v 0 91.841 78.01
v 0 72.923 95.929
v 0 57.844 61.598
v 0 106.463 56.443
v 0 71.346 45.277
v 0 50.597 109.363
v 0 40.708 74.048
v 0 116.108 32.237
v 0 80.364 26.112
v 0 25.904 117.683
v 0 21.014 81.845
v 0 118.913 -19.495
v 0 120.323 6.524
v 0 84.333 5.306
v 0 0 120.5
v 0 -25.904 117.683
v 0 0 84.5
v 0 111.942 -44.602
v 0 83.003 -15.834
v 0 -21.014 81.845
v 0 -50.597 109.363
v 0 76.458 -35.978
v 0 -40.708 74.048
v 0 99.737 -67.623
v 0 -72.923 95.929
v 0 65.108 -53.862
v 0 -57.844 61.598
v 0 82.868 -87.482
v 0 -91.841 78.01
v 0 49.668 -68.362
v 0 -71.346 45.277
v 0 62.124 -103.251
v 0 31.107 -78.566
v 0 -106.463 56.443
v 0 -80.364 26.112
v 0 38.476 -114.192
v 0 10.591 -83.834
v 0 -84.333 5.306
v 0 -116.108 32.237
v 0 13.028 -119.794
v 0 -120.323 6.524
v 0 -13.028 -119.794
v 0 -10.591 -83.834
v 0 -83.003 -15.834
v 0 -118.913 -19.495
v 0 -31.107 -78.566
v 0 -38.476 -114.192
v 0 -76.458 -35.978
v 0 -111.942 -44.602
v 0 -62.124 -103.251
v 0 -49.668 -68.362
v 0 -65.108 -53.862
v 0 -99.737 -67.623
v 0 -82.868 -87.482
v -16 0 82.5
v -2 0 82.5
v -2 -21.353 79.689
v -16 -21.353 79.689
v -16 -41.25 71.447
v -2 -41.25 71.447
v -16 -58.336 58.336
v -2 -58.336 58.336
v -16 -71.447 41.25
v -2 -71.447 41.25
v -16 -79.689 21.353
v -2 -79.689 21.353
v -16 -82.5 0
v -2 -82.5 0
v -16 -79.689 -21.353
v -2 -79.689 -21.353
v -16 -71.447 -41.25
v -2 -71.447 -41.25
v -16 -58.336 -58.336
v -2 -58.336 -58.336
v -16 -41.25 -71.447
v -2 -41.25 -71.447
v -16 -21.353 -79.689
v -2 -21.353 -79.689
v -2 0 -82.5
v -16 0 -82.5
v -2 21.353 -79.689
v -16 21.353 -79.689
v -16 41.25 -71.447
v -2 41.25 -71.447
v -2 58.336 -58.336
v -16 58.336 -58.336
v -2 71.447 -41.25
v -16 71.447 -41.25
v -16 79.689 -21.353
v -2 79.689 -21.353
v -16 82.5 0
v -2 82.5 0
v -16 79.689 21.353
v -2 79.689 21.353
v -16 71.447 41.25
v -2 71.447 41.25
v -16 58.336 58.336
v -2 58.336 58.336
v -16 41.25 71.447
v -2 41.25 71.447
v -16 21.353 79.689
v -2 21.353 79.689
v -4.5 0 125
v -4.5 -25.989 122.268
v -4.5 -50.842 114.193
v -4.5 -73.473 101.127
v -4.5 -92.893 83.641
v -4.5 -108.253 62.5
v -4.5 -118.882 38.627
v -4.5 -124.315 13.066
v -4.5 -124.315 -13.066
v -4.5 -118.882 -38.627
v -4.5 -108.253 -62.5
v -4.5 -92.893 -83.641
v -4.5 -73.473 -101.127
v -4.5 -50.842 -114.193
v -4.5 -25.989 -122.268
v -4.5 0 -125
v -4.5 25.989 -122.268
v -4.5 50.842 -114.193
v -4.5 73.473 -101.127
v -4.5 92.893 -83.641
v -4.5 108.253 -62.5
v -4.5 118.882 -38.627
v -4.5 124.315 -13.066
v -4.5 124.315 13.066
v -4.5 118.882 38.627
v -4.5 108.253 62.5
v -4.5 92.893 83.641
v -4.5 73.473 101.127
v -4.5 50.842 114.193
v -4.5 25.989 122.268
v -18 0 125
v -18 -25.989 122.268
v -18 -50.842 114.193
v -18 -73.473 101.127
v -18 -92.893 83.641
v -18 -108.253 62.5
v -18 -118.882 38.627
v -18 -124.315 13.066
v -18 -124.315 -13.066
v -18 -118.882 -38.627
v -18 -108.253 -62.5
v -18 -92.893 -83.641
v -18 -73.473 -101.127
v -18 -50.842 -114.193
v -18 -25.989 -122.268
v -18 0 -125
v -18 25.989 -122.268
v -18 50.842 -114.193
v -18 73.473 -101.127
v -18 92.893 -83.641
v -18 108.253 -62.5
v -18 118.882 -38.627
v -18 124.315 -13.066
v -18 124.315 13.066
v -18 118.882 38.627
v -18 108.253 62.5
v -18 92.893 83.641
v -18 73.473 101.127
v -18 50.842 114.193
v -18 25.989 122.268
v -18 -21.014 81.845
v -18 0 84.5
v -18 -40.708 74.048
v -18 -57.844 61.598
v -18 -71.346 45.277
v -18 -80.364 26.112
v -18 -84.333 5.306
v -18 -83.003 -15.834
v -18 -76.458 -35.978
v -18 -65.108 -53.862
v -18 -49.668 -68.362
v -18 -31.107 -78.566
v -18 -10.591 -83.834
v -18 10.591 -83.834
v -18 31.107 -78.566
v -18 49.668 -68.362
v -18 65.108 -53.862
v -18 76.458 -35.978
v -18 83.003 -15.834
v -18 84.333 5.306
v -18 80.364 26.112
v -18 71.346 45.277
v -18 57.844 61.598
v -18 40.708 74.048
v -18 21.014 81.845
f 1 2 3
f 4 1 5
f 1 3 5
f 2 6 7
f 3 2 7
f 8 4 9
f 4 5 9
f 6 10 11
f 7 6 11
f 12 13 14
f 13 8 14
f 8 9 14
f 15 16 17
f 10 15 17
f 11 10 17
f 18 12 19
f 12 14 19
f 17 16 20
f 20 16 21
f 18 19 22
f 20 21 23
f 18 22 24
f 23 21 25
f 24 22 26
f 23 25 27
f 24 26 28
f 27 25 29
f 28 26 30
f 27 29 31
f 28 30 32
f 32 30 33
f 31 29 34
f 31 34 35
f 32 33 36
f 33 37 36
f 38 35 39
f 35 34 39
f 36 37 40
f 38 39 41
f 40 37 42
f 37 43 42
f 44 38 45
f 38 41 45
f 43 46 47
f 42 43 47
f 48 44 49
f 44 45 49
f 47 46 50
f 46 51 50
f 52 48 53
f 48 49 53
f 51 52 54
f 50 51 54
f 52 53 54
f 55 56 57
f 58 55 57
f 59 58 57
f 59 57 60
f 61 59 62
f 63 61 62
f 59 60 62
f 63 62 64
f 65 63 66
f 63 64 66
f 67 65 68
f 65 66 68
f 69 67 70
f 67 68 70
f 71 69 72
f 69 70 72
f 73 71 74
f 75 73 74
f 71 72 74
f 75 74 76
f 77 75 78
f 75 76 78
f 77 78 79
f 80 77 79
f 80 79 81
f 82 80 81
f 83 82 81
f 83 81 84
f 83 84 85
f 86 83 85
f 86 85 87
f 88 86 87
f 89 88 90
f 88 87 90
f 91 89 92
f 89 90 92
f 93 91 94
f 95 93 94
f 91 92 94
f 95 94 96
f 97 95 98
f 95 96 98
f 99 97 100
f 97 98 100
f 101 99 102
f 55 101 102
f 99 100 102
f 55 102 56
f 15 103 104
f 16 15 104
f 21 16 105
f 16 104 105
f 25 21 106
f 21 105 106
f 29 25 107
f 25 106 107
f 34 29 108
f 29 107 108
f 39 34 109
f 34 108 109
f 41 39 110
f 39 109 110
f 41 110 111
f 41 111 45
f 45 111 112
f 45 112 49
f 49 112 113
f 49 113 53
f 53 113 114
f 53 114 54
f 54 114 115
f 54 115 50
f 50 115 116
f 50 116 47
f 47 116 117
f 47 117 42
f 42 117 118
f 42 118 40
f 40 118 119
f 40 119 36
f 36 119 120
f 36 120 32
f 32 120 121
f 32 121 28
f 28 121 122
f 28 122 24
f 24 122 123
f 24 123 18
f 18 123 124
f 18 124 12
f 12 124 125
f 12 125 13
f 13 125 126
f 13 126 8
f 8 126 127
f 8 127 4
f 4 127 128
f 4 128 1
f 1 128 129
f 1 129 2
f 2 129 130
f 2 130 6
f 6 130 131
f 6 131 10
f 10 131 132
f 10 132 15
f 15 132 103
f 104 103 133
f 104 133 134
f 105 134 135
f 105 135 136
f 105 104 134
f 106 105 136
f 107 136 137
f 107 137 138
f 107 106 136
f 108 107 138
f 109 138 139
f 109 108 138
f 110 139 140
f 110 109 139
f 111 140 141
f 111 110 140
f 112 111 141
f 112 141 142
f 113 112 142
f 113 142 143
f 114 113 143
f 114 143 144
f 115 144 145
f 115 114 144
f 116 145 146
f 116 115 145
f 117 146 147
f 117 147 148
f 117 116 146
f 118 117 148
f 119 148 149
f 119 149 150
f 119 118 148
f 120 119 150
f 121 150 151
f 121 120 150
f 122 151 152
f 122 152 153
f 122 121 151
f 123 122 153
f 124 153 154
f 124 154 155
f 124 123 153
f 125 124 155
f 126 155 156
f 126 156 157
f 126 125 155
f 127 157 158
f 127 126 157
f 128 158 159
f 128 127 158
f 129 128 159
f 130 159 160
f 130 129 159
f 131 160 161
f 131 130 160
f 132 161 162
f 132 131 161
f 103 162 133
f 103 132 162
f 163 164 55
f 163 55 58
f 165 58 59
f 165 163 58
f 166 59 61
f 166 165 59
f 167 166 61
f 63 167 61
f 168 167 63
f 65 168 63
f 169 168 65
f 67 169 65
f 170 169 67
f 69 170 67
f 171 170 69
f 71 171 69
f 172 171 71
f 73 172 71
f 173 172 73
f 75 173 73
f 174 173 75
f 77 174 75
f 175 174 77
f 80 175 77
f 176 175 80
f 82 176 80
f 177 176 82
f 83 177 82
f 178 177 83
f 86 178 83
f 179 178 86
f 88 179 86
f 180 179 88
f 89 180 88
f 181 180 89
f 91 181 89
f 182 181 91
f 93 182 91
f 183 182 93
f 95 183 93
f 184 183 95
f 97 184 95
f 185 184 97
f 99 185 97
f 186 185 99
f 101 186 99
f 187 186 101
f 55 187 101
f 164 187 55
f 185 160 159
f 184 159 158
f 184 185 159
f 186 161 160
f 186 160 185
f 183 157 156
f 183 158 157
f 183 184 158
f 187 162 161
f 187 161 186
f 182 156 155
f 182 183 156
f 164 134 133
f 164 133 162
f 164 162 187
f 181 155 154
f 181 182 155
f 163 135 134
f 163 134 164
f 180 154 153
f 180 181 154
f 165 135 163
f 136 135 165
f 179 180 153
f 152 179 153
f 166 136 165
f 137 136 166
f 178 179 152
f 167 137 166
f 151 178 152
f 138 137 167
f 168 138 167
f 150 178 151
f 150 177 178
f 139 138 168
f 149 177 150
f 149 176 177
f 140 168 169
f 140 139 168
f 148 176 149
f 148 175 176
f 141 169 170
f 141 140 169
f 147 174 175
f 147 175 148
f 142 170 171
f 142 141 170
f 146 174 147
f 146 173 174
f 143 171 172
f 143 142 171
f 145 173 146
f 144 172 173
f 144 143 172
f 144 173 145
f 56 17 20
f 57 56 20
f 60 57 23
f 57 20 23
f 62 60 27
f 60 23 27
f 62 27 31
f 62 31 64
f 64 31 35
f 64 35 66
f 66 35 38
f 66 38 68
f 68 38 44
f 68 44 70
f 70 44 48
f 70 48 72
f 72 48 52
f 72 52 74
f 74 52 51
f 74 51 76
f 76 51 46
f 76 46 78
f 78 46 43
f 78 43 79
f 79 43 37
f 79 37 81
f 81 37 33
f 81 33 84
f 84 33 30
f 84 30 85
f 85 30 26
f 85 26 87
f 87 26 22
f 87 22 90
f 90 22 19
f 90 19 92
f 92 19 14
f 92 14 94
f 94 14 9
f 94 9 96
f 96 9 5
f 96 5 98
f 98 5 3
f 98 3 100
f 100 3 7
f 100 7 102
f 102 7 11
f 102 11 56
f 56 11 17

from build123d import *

# Parameters (mm, degrees)
SKETCH1_W         = 18
SKETCH1_H         = 42.5
IDCHAMFER_SIZE    = 2
ODCHAMFER_SIZE    = 4.5
IDCHAMFERFAR_SIZE = 2


with BuildPart() as part:
    # Sketch1 → Base-Revolve (revolve)
    with BuildSketch(Plane.XY, mode=Mode.PRIVATE) as base_revolve_sk:
        with Locations((-9, 103.75)):
            Rectangle(SKETCH1_W, SKETCH1_H)
    revolve(base_revolve_sk.sketch.rotate(Axis((-34.925, 0, 0), (1, 0, 0)), 90), axis=Axis((-34.925, 0, 0), (1, 0, 0)))

    # IDChamfer
    idchamfer_edges = [part.edges().sort_by_distance(p)[0] for p in [
        (0, 0, -82.5),
    ]]
    chamfer(idchamfer_edges, length=IDCHAMFER_SIZE)

    # ODChamfer
    odchamfer_edges = [part.edges().sort_by_distance(p)[0] for p in [
        (0, 0, -125),
    ]]
    chamfer(odchamfer_edges, length=ODCHAMFER_SIZE)

    # IDChamferFar
    idchamferfar_edges = [part.edges().sort_by_distance(p)[0] for p in [
        (-18, 0, -82.5),
    ]]
    chamfer(idchamferfar_edges, length=IDCHAMFERFAR_SIZE)


solid = part.part
